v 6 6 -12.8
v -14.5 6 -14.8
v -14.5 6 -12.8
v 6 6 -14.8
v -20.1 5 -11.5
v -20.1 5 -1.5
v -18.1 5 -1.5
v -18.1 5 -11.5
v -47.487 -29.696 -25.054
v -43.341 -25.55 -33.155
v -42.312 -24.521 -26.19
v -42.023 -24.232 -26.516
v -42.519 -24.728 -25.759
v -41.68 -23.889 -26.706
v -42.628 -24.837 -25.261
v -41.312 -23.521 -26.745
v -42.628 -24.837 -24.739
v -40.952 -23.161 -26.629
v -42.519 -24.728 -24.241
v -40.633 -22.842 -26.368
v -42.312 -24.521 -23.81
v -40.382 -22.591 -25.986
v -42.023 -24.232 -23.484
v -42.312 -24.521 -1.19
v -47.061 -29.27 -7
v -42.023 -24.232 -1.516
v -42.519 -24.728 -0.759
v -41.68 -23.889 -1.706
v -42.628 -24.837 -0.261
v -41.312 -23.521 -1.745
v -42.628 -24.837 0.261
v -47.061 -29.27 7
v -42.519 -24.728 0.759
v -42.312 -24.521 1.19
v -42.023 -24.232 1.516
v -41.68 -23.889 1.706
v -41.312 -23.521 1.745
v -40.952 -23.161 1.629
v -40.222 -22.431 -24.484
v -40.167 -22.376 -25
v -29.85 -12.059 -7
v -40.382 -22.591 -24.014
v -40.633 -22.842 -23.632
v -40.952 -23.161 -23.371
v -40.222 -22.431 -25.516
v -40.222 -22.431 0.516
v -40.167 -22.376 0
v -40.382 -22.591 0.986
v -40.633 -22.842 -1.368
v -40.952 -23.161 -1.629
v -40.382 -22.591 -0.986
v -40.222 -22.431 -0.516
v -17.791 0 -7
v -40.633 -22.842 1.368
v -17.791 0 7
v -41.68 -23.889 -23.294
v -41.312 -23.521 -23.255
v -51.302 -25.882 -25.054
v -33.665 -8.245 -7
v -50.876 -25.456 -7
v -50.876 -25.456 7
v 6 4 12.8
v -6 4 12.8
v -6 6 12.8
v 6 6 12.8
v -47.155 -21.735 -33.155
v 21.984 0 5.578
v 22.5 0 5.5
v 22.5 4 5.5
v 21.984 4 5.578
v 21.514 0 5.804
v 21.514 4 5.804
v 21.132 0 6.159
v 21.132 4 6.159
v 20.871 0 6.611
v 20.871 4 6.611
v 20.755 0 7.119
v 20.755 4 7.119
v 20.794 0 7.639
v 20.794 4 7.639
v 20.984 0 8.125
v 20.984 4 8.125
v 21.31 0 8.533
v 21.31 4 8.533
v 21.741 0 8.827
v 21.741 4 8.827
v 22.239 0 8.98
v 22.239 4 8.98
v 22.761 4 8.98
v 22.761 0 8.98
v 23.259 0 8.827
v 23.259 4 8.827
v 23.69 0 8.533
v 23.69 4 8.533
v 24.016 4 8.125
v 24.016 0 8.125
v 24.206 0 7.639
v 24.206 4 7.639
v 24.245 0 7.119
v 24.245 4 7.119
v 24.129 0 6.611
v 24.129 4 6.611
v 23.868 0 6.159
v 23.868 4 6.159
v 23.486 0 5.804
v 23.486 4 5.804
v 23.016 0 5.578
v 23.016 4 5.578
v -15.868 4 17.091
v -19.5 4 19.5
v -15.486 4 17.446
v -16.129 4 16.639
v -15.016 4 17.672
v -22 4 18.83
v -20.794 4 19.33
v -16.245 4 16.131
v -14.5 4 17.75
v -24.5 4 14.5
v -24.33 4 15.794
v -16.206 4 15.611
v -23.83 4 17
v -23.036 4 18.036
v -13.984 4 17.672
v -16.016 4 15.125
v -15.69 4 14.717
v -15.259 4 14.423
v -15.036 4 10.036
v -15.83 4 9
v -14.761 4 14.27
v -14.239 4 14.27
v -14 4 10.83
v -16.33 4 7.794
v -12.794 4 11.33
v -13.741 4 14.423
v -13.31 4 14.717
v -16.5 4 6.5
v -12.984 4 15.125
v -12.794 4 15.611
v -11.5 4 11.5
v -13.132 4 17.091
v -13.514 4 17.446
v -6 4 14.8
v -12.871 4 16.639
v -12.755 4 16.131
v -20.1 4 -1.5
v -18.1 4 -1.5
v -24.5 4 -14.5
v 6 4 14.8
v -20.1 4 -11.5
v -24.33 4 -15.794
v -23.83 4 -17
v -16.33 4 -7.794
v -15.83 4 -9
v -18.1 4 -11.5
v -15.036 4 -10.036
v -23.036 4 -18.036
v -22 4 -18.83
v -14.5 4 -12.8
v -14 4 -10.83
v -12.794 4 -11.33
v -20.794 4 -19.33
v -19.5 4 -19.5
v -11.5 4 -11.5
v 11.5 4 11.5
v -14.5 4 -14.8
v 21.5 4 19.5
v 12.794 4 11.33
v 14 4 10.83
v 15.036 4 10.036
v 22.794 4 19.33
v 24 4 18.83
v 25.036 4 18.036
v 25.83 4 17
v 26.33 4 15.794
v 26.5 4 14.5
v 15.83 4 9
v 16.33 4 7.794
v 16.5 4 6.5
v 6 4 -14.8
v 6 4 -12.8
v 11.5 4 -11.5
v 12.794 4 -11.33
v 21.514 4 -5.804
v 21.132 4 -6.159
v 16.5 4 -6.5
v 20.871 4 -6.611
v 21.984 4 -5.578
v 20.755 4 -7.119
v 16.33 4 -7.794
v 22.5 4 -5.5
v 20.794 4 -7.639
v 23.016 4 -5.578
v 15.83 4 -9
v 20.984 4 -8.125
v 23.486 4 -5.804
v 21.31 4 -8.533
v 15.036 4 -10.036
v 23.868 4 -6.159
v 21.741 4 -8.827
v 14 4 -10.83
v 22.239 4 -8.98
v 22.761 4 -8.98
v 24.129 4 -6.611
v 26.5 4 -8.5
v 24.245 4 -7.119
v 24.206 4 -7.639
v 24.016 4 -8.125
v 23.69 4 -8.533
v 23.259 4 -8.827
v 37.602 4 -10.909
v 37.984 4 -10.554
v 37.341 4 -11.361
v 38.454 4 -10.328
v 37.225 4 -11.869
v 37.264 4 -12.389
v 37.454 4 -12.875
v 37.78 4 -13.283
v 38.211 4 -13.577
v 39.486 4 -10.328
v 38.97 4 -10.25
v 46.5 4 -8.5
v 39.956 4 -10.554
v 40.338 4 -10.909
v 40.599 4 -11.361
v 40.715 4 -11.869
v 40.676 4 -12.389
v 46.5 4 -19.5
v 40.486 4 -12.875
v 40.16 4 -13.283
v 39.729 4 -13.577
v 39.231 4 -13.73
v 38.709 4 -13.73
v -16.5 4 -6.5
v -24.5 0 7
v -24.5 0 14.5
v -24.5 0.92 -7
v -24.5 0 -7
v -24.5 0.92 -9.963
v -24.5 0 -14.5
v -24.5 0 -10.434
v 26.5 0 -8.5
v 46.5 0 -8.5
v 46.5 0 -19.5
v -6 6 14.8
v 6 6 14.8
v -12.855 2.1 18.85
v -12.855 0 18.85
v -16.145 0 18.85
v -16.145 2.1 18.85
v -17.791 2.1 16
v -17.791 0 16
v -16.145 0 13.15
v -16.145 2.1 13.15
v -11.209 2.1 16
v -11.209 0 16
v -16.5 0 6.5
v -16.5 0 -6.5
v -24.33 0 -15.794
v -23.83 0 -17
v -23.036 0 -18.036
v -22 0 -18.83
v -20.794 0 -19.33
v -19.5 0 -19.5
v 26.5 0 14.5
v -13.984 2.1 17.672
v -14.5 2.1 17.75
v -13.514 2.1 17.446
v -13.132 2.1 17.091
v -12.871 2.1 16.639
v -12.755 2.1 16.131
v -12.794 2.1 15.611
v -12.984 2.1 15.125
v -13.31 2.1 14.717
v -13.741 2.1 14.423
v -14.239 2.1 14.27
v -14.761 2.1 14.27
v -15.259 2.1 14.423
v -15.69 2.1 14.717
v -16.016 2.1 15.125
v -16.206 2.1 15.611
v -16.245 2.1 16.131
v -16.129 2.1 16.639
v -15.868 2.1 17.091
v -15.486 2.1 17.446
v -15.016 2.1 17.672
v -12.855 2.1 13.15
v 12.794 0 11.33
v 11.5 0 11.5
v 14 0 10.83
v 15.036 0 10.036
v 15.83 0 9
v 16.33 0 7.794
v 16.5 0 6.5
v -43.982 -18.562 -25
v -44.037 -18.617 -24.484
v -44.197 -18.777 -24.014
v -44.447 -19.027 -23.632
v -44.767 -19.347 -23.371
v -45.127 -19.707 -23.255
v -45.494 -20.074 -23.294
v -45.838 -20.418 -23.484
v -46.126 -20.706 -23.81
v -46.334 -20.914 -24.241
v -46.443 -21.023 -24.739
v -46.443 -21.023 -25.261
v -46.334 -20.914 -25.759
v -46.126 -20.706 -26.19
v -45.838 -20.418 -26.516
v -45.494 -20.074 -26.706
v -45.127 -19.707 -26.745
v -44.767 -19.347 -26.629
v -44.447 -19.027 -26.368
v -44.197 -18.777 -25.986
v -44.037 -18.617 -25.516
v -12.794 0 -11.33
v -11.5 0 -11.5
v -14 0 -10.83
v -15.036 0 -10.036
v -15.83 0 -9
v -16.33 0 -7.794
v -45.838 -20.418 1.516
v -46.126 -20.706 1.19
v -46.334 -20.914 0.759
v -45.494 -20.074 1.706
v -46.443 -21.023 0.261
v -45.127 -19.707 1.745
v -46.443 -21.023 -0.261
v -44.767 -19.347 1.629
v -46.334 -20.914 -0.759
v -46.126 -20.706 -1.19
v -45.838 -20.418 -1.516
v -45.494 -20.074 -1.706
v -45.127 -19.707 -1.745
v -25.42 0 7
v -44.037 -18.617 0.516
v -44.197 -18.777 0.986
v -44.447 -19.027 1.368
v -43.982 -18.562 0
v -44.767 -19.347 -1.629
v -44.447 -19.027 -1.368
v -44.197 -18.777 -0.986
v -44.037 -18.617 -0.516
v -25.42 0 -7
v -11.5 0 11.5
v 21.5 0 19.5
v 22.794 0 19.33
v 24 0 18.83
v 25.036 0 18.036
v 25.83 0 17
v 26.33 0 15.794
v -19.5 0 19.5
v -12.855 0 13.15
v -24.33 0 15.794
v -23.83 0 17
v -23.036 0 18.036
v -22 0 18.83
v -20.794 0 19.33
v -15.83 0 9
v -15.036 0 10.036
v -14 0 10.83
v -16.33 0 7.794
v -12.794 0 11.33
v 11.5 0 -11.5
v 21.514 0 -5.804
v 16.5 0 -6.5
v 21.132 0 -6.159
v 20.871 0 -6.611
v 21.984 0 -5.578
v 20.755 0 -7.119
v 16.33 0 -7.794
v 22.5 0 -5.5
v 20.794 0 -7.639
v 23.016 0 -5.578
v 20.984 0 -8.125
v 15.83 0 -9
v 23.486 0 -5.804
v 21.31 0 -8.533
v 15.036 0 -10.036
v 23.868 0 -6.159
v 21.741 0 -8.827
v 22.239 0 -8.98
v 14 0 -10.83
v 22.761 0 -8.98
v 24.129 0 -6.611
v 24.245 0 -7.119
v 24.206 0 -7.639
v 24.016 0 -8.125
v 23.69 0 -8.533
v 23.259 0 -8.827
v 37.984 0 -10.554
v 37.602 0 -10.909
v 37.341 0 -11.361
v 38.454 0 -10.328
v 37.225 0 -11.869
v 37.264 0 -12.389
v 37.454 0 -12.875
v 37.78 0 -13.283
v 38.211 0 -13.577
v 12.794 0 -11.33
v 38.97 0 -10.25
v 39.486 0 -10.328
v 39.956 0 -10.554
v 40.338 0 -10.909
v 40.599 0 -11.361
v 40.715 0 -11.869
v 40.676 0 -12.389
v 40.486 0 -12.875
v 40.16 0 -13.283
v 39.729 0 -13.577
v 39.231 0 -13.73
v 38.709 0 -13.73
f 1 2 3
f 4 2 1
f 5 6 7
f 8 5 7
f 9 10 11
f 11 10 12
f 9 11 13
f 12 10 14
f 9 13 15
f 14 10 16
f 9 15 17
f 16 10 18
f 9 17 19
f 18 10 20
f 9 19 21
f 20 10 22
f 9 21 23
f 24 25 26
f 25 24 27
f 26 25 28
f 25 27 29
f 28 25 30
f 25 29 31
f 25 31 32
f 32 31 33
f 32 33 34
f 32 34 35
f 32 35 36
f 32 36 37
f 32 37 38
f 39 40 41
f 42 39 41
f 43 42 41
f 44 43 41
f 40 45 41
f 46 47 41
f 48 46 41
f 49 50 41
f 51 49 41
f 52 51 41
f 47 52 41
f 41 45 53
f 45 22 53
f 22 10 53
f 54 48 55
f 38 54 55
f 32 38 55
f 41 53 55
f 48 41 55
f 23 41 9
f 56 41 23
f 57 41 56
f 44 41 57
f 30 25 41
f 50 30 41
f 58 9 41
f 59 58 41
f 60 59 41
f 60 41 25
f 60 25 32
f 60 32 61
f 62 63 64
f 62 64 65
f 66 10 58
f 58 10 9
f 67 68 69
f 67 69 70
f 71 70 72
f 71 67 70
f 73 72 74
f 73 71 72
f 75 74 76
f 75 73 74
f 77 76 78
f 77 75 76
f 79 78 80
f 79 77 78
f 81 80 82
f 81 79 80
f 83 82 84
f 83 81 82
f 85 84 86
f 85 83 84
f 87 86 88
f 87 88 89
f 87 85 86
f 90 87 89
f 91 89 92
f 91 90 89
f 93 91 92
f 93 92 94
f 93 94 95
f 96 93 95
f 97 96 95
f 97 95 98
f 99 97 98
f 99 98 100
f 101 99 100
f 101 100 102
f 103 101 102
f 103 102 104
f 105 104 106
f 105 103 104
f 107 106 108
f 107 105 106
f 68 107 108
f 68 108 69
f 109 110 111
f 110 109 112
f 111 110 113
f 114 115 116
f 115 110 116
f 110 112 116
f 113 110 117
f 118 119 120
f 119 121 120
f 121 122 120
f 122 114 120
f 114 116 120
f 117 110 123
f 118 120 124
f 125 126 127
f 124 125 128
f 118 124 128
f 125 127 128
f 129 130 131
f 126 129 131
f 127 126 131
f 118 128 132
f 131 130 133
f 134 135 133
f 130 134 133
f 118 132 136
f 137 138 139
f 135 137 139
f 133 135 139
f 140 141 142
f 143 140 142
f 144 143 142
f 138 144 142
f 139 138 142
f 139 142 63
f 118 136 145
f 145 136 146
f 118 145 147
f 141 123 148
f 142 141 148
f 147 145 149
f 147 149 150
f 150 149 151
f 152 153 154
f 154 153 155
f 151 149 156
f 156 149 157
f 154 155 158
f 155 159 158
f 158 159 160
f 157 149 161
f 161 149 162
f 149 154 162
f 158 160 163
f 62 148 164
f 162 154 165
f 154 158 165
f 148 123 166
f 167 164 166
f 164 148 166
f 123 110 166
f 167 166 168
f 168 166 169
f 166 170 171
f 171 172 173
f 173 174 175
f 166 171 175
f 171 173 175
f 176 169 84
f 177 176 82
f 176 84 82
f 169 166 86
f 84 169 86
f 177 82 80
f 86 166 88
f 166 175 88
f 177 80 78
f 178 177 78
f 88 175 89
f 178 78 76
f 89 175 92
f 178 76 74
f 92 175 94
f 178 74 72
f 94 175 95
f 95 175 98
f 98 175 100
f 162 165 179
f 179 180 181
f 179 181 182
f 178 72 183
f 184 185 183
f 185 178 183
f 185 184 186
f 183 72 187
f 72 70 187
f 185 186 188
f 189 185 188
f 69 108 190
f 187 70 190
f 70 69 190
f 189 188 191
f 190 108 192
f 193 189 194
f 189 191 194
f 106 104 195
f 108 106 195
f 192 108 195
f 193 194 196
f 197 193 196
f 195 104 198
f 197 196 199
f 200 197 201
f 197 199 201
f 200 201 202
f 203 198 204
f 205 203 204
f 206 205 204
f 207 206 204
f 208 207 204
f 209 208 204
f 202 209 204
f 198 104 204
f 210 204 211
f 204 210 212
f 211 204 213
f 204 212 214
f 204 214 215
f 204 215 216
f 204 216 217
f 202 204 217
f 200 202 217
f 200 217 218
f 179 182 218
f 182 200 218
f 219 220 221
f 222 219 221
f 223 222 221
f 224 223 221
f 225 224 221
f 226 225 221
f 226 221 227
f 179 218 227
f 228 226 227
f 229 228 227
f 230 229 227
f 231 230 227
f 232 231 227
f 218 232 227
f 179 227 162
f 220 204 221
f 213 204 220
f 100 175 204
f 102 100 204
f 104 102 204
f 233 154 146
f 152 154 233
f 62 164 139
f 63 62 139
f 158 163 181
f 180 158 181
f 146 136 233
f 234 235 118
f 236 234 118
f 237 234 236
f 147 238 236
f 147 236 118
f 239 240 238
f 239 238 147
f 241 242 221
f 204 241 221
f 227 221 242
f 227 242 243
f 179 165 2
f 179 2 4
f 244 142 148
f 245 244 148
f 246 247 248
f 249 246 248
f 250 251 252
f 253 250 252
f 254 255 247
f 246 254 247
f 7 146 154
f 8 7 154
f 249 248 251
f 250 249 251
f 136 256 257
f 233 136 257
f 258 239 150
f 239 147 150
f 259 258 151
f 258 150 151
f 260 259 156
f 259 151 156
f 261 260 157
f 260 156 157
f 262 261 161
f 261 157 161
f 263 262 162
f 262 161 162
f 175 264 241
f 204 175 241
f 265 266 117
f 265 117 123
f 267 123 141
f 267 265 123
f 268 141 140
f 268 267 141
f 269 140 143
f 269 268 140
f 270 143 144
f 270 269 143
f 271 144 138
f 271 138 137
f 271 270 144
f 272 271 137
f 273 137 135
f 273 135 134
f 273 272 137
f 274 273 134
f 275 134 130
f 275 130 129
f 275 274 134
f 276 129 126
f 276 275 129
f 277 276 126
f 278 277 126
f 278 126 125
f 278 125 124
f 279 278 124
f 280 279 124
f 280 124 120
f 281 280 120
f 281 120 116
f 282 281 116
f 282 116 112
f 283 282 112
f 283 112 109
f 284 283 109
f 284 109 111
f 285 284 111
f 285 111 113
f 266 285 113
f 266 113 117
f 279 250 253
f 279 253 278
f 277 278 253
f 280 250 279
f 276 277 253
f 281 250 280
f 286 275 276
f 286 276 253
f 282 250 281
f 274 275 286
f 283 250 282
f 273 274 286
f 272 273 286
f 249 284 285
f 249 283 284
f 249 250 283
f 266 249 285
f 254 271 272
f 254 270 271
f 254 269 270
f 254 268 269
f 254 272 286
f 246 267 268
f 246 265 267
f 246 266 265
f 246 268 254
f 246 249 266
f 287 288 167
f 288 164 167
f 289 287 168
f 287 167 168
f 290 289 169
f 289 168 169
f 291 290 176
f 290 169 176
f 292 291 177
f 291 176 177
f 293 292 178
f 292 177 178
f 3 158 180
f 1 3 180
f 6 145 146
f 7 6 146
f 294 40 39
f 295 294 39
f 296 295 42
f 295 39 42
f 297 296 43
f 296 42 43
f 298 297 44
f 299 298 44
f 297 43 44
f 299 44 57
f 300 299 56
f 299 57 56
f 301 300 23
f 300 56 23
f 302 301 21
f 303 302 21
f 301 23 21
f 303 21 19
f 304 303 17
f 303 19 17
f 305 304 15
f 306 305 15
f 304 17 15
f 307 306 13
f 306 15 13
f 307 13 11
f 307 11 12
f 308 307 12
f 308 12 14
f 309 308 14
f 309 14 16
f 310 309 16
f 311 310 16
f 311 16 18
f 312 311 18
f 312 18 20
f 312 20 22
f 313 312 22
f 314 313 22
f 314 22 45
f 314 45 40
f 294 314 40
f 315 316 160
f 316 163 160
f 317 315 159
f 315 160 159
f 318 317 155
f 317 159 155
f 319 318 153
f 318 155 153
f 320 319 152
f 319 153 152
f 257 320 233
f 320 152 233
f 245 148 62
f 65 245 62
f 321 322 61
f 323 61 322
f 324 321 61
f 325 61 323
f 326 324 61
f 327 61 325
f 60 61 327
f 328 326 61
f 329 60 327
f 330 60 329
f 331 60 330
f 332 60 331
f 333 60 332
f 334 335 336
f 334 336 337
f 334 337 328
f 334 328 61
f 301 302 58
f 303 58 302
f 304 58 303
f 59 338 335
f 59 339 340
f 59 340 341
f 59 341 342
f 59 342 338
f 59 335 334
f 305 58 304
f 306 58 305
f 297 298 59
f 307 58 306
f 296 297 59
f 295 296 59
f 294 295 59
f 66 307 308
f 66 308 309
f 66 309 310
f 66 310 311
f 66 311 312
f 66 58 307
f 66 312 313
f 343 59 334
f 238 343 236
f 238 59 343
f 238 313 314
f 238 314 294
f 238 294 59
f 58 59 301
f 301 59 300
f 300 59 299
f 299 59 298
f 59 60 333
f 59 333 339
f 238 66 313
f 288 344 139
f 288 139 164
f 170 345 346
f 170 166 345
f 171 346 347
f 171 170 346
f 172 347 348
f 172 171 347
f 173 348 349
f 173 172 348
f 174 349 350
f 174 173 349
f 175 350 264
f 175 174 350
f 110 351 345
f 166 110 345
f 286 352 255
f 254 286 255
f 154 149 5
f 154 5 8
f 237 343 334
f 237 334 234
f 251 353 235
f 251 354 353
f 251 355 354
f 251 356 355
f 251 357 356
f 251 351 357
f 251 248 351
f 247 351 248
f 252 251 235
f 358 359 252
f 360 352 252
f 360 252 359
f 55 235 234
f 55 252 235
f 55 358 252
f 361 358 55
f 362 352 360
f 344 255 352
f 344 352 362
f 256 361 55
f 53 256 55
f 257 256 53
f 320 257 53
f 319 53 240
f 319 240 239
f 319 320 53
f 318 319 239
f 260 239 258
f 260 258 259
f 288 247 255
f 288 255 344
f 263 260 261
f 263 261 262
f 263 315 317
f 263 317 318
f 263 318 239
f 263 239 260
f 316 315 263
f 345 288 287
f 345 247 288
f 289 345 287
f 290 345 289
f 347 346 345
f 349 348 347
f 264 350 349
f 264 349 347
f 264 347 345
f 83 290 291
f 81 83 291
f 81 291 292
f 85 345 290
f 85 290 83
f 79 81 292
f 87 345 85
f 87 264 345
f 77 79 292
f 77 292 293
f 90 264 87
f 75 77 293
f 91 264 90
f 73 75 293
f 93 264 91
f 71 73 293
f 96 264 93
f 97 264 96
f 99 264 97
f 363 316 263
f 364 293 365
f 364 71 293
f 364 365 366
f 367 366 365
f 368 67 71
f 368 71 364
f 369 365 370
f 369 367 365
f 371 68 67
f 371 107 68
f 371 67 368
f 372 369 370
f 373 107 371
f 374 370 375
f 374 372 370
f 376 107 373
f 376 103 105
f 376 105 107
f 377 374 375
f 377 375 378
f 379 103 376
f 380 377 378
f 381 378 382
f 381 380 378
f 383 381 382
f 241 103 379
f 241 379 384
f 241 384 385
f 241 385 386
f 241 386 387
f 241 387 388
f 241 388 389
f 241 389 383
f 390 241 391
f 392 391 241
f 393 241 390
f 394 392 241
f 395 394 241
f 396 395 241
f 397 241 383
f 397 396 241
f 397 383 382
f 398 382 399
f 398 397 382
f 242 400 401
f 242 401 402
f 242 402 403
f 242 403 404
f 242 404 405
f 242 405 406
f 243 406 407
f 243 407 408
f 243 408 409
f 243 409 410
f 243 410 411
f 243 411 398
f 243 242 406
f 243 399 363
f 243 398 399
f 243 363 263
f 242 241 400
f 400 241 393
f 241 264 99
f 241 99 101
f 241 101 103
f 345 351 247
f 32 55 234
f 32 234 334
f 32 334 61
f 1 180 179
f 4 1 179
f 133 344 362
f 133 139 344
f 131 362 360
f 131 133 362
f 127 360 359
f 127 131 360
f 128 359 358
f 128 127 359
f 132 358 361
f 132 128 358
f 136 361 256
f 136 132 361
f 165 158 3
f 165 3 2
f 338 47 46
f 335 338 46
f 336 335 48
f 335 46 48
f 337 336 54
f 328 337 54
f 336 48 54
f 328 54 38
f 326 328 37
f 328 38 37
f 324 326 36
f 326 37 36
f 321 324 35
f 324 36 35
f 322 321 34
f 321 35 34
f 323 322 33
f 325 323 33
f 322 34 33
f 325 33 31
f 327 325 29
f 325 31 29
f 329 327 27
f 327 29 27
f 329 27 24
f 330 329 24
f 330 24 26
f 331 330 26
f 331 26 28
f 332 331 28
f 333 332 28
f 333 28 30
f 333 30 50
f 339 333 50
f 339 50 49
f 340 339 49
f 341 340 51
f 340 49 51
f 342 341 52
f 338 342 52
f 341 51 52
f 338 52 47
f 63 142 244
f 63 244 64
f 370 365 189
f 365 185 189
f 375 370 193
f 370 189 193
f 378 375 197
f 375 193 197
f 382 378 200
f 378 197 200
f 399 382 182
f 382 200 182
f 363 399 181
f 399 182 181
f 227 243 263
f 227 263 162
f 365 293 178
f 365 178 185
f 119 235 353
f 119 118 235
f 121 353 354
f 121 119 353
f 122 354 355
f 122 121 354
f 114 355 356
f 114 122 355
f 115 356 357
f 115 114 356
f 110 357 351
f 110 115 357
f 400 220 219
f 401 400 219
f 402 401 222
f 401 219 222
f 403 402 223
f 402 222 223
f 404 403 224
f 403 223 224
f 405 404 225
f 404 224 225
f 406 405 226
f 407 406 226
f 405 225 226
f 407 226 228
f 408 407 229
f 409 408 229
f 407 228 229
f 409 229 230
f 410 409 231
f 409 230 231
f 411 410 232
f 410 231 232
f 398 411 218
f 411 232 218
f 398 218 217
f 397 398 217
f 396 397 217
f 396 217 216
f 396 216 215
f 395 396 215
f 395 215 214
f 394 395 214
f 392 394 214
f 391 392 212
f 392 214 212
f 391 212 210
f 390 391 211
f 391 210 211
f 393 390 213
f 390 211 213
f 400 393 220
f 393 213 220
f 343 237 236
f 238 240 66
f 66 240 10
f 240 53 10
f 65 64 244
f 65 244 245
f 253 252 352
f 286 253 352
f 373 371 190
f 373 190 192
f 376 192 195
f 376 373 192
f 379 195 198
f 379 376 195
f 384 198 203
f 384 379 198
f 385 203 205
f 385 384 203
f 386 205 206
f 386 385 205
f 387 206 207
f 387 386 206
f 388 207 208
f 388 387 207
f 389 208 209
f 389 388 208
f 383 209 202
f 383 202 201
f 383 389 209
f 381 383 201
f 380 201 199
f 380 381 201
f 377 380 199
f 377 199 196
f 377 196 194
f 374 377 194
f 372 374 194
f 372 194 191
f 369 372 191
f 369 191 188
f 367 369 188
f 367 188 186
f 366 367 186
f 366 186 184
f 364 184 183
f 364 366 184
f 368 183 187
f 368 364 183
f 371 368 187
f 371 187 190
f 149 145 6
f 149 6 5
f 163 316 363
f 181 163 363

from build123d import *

# Parameters (mm, degrees)
SKETCH1_W                       = 51
SKETCH1_H                       = 39
SKETCH1_R                       = 1.75
SKETCH1_W_2                     = 33
SKETCH1_H_2                     = 23
BOSS_EXTRUDE1_DEPTH             = 4
FILLET1_R                       = 5
SKETCH2_W                       = 20.5
SKETCH2_H                       = 2
SKETCH2_W_2                     = 12
BOSS_EXTRUDE4_DEPTH             = 2
FILLET5_R                       = 5
CUT_EXTRUDE1_DEPTH              = 2.1
SKETCH5_W                       = 2
SKETCH5_H                       = 10
BOSS_EXTRUDE5_DEPTH             = 1
BOSS_EXTRUDE6_DEPTH             = 7
BOSS_EXTRUDE6_DEPTH_BACK        = 7
SKETCH7_R                       = 1.75
CUT_EXTRUDE2_DEPTH              = 5.394590795
BOSS_EXTRUDE7_REACH             = 61.994
SKETCH8_R                       = 1.75
SKETCH10_W                      = 11
SKETCH10_H                      = 4
BOSS_EXTRUDE9_DEPTH             = 20
BOSS_EXTRUDE9_DIRECTION_2_REACH = 91.634
SKETCH11_R                      = 1.75
CUT_EXTRUDE3_DEPTH              = 4


with BuildPart() as part:
    # Sketch1 → Boss-Extrude1 (new body)
    with BuildSketch(Plane(origin=(0, 0, 0), x_dir=(1, 0, 0), z_dir=(0, 1, 0))):
        with Locations((1, 0)):
            Rectangle(SKETCH1_W, SKETCH1_H)
        with Locations(Location((22.5, 7.25, 0), (0, 0, 270))):
            Circle(SKETCH1_R, mode=Mode.SUBTRACT)
        with Locations(Location((22.5, -7.25, 0), (0, 0, 90))):
            Circle(SKETCH1_R, mode=Mode.SUBTRACT)
        with Locations(Location((-14.5, -16, 0), (0, 0, 270))):
            Circle(SKETCH1_R, mode=Mode.SUBTRACT)
        Rectangle(SKETCH1_W_2, SKETCH1_H_2, mode=Mode.SUBTRACT)
    extrude(amount=BOSS_EXTRUDE1_DEPTH)

    # Fillet1
    fillet1_edges = [part.edges().sort_by_distance(p)[0] for p in [
        (-16.5, 2, -11.5),
        (-16.5, 2, 11.5),
        (16.5, 2, 11.5),
        (16.5, 2, -11.5),
    ]]
    fillet(fillet1_edges, radius=FILLET1_R)

    # Sketch2 → Boss-Extrude4 (add)
    with BuildSketch(Plane(origin=(0, 4, 0), x_dir=(1, 0, 0), z_dir=(0, 1, 0))):
        with Locations((-4.25, 13.8)):
            Rectangle(SKETCH2_W, SKETCH2_H)
        with Locations((0, -13.8)):
            Rectangle(SKETCH2_W_2, SKETCH2_H)
    extrude(amount=BOSS_EXTRUDE4_DEPTH)

    # Fillet5
    fillet5_edges = [part.edges().sort_by_distance(p)[0] for p in [
        (-24.5, 2, -19.5),
        (26.5, 2, -19.5),
        (26.5, 2, 19.5),
        (-24.5, 2, 19.5),
    ]]
    fillet(fillet5_edges, radius=FILLET5_R)

    # Sketch4 → Cut-Extrude1 (cut)
    with BuildSketch(Plane.XZ):
        Polygon((-12.854551733, 13.15), (-11.209103466, 16), (-12.854551733, 18.85), (-16.145448267, 18.85), (-17.790896534, 16), (-16.145448267, 13.15), align=None)
    extrude(amount=-CUT_EXTRUDE1_DEPTH, mode=Mode.SUBTRACT)

    # Sketch5 → Boss-Extrude5 (add)
    with BuildSketch(Plane(origin=(0, 4, 0), x_dir=(1, 0, 0), z_dir=(0, 1, 0))):
        with Locations((-19.1, 6.5)):
            Rectangle(SKETCH5_W, SKETCH5_H)
    extrude(amount=BOSS_EXTRUDE5_DEPTH)

    # Sketch6 → Boss-Extrude6 (add, two sides: drawn at the far end of the back side and taken through both)
    with BuildSketch(Plane.XY.offset(-BOSS_EXTRUDE6_DEPTH_BACK)):
        Polygon((-50.875844123, -25.455844123), (-25.42, 0), (-17.790896534, 0), (-47.06129239, -29.270395856), align=None)
    extrude(amount=BOSS_EXTRUDE6_DEPTH + BOSS_EXTRUDE6_DEPTH_BACK)

    # Sketch7 → Cut-Extrude2 (cut)
    with BuildSketch(Plane(origin=(-8.895448267, 8.895448267, 0), x_dir=(0, 0, -1), z_dir=(0.7071067811865489, -0.7071067811865462, 0))):
        with Locations(Location((0, -45.974654378, 0), (0, 0, 90))):
            Circle(SKETCH7_R)
    extrude(amount=-CUT_EXTRUDE2_DEPTH, mode=Mode.SUBTRACT)

    # Boss-Extrude7: up to this face of the body (flat: up to its plane)
    boss_extrude7_end = Plane(part.part.faces().sort_by_distance((-38.010311721, -12.590311721, 0))[0])
    # Sketch8 → Boss-Extrude7 (add, up to the picked face)
    with BuildSketch(Plane(origin=(-8.895448267, 8.895448267, 0), x_dir=(0, 0, -1), z_dir=(0.7071067811865489, -0.7071067811865462, 0)), mode=Mode.PRIVATE) as boss_extrude7_sk1:
        Polygon((7, -12.580063583), (33.15474804, -48.713282576), (25.054188906, -54.576808966), (7, -29.634647011), align=None)
        with Locations(Location((25, -45.974654378, 0), (0, 0, 90))):
            Circle(SKETCH8_R, mode=Mode.SUBTRACT)
    boss_extrude7_tool1 = split(extrude(boss_extrude7_sk1.sketch, amount=-BOSS_EXTRUDE7_REACH, mode=Mode.PRIVATE), bisect_by=boss_extrude7_end, keep=Keep.BOTH, mode=Mode.PRIVATE)
    add(boss_extrude7_tool1.solids().sort_by(Axis((-34.185622, -16.394725, -17.997204), (-0.7071067811865489, 0.7071067811865462, 0)))[0])

    # Sketch10 → Boss-Extrude9 (add)
    with BuildSketch(Plane(origin=(26.5, 0, 0), x_dir=(0, 0, -1), z_dir=(1, 0, 0))):
        with Locations((14, 2)):
            Rectangle(SKETCH10_W, SKETCH10_H)
    extrude(amount=BOSS_EXTRUDE9_DEPTH)

    # Sketch10 → Boss-Extrude9 direction 2 (add, up to next)
    with BuildSketch(Plane(origin=(26.5, 0, 0), x_dir=(0, 0, -1), z_dir=(1, 0, 0)), mode=Mode.PRIVATE) as boss_extrude9_direction_2_sk1:
        with Locations((14, 2)):
            Rectangle(SKETCH10_W, SKETCH10_H)
    boss_extrude9_direction_2_tool1 = extrude(boss_extrude9_direction_2_sk1.sketch, amount=-BOSS_EXTRUDE9_DIRECTION_2_REACH, mode=Mode.PRIVATE) - part.part
    add(boss_extrude9_direction_2_tool1.solids().sort_by_distance((26.5, 2, -14))[0])

    # Sketch11 → Cut-Extrude3 (cut)
    with BuildSketch(Plane(origin=(0, 4, 0), x_dir=(1, 0, 0), z_dir=(0, 1, 0))):
        with Locations(Location((38.97, 12, 0), (0, 0, 270))):
            Circle(SKETCH11_R)
    extrude(amount=-CUT_EXTRUDE3_DEPTH, mode=Mode.SUBTRACT)


solid = part.part
